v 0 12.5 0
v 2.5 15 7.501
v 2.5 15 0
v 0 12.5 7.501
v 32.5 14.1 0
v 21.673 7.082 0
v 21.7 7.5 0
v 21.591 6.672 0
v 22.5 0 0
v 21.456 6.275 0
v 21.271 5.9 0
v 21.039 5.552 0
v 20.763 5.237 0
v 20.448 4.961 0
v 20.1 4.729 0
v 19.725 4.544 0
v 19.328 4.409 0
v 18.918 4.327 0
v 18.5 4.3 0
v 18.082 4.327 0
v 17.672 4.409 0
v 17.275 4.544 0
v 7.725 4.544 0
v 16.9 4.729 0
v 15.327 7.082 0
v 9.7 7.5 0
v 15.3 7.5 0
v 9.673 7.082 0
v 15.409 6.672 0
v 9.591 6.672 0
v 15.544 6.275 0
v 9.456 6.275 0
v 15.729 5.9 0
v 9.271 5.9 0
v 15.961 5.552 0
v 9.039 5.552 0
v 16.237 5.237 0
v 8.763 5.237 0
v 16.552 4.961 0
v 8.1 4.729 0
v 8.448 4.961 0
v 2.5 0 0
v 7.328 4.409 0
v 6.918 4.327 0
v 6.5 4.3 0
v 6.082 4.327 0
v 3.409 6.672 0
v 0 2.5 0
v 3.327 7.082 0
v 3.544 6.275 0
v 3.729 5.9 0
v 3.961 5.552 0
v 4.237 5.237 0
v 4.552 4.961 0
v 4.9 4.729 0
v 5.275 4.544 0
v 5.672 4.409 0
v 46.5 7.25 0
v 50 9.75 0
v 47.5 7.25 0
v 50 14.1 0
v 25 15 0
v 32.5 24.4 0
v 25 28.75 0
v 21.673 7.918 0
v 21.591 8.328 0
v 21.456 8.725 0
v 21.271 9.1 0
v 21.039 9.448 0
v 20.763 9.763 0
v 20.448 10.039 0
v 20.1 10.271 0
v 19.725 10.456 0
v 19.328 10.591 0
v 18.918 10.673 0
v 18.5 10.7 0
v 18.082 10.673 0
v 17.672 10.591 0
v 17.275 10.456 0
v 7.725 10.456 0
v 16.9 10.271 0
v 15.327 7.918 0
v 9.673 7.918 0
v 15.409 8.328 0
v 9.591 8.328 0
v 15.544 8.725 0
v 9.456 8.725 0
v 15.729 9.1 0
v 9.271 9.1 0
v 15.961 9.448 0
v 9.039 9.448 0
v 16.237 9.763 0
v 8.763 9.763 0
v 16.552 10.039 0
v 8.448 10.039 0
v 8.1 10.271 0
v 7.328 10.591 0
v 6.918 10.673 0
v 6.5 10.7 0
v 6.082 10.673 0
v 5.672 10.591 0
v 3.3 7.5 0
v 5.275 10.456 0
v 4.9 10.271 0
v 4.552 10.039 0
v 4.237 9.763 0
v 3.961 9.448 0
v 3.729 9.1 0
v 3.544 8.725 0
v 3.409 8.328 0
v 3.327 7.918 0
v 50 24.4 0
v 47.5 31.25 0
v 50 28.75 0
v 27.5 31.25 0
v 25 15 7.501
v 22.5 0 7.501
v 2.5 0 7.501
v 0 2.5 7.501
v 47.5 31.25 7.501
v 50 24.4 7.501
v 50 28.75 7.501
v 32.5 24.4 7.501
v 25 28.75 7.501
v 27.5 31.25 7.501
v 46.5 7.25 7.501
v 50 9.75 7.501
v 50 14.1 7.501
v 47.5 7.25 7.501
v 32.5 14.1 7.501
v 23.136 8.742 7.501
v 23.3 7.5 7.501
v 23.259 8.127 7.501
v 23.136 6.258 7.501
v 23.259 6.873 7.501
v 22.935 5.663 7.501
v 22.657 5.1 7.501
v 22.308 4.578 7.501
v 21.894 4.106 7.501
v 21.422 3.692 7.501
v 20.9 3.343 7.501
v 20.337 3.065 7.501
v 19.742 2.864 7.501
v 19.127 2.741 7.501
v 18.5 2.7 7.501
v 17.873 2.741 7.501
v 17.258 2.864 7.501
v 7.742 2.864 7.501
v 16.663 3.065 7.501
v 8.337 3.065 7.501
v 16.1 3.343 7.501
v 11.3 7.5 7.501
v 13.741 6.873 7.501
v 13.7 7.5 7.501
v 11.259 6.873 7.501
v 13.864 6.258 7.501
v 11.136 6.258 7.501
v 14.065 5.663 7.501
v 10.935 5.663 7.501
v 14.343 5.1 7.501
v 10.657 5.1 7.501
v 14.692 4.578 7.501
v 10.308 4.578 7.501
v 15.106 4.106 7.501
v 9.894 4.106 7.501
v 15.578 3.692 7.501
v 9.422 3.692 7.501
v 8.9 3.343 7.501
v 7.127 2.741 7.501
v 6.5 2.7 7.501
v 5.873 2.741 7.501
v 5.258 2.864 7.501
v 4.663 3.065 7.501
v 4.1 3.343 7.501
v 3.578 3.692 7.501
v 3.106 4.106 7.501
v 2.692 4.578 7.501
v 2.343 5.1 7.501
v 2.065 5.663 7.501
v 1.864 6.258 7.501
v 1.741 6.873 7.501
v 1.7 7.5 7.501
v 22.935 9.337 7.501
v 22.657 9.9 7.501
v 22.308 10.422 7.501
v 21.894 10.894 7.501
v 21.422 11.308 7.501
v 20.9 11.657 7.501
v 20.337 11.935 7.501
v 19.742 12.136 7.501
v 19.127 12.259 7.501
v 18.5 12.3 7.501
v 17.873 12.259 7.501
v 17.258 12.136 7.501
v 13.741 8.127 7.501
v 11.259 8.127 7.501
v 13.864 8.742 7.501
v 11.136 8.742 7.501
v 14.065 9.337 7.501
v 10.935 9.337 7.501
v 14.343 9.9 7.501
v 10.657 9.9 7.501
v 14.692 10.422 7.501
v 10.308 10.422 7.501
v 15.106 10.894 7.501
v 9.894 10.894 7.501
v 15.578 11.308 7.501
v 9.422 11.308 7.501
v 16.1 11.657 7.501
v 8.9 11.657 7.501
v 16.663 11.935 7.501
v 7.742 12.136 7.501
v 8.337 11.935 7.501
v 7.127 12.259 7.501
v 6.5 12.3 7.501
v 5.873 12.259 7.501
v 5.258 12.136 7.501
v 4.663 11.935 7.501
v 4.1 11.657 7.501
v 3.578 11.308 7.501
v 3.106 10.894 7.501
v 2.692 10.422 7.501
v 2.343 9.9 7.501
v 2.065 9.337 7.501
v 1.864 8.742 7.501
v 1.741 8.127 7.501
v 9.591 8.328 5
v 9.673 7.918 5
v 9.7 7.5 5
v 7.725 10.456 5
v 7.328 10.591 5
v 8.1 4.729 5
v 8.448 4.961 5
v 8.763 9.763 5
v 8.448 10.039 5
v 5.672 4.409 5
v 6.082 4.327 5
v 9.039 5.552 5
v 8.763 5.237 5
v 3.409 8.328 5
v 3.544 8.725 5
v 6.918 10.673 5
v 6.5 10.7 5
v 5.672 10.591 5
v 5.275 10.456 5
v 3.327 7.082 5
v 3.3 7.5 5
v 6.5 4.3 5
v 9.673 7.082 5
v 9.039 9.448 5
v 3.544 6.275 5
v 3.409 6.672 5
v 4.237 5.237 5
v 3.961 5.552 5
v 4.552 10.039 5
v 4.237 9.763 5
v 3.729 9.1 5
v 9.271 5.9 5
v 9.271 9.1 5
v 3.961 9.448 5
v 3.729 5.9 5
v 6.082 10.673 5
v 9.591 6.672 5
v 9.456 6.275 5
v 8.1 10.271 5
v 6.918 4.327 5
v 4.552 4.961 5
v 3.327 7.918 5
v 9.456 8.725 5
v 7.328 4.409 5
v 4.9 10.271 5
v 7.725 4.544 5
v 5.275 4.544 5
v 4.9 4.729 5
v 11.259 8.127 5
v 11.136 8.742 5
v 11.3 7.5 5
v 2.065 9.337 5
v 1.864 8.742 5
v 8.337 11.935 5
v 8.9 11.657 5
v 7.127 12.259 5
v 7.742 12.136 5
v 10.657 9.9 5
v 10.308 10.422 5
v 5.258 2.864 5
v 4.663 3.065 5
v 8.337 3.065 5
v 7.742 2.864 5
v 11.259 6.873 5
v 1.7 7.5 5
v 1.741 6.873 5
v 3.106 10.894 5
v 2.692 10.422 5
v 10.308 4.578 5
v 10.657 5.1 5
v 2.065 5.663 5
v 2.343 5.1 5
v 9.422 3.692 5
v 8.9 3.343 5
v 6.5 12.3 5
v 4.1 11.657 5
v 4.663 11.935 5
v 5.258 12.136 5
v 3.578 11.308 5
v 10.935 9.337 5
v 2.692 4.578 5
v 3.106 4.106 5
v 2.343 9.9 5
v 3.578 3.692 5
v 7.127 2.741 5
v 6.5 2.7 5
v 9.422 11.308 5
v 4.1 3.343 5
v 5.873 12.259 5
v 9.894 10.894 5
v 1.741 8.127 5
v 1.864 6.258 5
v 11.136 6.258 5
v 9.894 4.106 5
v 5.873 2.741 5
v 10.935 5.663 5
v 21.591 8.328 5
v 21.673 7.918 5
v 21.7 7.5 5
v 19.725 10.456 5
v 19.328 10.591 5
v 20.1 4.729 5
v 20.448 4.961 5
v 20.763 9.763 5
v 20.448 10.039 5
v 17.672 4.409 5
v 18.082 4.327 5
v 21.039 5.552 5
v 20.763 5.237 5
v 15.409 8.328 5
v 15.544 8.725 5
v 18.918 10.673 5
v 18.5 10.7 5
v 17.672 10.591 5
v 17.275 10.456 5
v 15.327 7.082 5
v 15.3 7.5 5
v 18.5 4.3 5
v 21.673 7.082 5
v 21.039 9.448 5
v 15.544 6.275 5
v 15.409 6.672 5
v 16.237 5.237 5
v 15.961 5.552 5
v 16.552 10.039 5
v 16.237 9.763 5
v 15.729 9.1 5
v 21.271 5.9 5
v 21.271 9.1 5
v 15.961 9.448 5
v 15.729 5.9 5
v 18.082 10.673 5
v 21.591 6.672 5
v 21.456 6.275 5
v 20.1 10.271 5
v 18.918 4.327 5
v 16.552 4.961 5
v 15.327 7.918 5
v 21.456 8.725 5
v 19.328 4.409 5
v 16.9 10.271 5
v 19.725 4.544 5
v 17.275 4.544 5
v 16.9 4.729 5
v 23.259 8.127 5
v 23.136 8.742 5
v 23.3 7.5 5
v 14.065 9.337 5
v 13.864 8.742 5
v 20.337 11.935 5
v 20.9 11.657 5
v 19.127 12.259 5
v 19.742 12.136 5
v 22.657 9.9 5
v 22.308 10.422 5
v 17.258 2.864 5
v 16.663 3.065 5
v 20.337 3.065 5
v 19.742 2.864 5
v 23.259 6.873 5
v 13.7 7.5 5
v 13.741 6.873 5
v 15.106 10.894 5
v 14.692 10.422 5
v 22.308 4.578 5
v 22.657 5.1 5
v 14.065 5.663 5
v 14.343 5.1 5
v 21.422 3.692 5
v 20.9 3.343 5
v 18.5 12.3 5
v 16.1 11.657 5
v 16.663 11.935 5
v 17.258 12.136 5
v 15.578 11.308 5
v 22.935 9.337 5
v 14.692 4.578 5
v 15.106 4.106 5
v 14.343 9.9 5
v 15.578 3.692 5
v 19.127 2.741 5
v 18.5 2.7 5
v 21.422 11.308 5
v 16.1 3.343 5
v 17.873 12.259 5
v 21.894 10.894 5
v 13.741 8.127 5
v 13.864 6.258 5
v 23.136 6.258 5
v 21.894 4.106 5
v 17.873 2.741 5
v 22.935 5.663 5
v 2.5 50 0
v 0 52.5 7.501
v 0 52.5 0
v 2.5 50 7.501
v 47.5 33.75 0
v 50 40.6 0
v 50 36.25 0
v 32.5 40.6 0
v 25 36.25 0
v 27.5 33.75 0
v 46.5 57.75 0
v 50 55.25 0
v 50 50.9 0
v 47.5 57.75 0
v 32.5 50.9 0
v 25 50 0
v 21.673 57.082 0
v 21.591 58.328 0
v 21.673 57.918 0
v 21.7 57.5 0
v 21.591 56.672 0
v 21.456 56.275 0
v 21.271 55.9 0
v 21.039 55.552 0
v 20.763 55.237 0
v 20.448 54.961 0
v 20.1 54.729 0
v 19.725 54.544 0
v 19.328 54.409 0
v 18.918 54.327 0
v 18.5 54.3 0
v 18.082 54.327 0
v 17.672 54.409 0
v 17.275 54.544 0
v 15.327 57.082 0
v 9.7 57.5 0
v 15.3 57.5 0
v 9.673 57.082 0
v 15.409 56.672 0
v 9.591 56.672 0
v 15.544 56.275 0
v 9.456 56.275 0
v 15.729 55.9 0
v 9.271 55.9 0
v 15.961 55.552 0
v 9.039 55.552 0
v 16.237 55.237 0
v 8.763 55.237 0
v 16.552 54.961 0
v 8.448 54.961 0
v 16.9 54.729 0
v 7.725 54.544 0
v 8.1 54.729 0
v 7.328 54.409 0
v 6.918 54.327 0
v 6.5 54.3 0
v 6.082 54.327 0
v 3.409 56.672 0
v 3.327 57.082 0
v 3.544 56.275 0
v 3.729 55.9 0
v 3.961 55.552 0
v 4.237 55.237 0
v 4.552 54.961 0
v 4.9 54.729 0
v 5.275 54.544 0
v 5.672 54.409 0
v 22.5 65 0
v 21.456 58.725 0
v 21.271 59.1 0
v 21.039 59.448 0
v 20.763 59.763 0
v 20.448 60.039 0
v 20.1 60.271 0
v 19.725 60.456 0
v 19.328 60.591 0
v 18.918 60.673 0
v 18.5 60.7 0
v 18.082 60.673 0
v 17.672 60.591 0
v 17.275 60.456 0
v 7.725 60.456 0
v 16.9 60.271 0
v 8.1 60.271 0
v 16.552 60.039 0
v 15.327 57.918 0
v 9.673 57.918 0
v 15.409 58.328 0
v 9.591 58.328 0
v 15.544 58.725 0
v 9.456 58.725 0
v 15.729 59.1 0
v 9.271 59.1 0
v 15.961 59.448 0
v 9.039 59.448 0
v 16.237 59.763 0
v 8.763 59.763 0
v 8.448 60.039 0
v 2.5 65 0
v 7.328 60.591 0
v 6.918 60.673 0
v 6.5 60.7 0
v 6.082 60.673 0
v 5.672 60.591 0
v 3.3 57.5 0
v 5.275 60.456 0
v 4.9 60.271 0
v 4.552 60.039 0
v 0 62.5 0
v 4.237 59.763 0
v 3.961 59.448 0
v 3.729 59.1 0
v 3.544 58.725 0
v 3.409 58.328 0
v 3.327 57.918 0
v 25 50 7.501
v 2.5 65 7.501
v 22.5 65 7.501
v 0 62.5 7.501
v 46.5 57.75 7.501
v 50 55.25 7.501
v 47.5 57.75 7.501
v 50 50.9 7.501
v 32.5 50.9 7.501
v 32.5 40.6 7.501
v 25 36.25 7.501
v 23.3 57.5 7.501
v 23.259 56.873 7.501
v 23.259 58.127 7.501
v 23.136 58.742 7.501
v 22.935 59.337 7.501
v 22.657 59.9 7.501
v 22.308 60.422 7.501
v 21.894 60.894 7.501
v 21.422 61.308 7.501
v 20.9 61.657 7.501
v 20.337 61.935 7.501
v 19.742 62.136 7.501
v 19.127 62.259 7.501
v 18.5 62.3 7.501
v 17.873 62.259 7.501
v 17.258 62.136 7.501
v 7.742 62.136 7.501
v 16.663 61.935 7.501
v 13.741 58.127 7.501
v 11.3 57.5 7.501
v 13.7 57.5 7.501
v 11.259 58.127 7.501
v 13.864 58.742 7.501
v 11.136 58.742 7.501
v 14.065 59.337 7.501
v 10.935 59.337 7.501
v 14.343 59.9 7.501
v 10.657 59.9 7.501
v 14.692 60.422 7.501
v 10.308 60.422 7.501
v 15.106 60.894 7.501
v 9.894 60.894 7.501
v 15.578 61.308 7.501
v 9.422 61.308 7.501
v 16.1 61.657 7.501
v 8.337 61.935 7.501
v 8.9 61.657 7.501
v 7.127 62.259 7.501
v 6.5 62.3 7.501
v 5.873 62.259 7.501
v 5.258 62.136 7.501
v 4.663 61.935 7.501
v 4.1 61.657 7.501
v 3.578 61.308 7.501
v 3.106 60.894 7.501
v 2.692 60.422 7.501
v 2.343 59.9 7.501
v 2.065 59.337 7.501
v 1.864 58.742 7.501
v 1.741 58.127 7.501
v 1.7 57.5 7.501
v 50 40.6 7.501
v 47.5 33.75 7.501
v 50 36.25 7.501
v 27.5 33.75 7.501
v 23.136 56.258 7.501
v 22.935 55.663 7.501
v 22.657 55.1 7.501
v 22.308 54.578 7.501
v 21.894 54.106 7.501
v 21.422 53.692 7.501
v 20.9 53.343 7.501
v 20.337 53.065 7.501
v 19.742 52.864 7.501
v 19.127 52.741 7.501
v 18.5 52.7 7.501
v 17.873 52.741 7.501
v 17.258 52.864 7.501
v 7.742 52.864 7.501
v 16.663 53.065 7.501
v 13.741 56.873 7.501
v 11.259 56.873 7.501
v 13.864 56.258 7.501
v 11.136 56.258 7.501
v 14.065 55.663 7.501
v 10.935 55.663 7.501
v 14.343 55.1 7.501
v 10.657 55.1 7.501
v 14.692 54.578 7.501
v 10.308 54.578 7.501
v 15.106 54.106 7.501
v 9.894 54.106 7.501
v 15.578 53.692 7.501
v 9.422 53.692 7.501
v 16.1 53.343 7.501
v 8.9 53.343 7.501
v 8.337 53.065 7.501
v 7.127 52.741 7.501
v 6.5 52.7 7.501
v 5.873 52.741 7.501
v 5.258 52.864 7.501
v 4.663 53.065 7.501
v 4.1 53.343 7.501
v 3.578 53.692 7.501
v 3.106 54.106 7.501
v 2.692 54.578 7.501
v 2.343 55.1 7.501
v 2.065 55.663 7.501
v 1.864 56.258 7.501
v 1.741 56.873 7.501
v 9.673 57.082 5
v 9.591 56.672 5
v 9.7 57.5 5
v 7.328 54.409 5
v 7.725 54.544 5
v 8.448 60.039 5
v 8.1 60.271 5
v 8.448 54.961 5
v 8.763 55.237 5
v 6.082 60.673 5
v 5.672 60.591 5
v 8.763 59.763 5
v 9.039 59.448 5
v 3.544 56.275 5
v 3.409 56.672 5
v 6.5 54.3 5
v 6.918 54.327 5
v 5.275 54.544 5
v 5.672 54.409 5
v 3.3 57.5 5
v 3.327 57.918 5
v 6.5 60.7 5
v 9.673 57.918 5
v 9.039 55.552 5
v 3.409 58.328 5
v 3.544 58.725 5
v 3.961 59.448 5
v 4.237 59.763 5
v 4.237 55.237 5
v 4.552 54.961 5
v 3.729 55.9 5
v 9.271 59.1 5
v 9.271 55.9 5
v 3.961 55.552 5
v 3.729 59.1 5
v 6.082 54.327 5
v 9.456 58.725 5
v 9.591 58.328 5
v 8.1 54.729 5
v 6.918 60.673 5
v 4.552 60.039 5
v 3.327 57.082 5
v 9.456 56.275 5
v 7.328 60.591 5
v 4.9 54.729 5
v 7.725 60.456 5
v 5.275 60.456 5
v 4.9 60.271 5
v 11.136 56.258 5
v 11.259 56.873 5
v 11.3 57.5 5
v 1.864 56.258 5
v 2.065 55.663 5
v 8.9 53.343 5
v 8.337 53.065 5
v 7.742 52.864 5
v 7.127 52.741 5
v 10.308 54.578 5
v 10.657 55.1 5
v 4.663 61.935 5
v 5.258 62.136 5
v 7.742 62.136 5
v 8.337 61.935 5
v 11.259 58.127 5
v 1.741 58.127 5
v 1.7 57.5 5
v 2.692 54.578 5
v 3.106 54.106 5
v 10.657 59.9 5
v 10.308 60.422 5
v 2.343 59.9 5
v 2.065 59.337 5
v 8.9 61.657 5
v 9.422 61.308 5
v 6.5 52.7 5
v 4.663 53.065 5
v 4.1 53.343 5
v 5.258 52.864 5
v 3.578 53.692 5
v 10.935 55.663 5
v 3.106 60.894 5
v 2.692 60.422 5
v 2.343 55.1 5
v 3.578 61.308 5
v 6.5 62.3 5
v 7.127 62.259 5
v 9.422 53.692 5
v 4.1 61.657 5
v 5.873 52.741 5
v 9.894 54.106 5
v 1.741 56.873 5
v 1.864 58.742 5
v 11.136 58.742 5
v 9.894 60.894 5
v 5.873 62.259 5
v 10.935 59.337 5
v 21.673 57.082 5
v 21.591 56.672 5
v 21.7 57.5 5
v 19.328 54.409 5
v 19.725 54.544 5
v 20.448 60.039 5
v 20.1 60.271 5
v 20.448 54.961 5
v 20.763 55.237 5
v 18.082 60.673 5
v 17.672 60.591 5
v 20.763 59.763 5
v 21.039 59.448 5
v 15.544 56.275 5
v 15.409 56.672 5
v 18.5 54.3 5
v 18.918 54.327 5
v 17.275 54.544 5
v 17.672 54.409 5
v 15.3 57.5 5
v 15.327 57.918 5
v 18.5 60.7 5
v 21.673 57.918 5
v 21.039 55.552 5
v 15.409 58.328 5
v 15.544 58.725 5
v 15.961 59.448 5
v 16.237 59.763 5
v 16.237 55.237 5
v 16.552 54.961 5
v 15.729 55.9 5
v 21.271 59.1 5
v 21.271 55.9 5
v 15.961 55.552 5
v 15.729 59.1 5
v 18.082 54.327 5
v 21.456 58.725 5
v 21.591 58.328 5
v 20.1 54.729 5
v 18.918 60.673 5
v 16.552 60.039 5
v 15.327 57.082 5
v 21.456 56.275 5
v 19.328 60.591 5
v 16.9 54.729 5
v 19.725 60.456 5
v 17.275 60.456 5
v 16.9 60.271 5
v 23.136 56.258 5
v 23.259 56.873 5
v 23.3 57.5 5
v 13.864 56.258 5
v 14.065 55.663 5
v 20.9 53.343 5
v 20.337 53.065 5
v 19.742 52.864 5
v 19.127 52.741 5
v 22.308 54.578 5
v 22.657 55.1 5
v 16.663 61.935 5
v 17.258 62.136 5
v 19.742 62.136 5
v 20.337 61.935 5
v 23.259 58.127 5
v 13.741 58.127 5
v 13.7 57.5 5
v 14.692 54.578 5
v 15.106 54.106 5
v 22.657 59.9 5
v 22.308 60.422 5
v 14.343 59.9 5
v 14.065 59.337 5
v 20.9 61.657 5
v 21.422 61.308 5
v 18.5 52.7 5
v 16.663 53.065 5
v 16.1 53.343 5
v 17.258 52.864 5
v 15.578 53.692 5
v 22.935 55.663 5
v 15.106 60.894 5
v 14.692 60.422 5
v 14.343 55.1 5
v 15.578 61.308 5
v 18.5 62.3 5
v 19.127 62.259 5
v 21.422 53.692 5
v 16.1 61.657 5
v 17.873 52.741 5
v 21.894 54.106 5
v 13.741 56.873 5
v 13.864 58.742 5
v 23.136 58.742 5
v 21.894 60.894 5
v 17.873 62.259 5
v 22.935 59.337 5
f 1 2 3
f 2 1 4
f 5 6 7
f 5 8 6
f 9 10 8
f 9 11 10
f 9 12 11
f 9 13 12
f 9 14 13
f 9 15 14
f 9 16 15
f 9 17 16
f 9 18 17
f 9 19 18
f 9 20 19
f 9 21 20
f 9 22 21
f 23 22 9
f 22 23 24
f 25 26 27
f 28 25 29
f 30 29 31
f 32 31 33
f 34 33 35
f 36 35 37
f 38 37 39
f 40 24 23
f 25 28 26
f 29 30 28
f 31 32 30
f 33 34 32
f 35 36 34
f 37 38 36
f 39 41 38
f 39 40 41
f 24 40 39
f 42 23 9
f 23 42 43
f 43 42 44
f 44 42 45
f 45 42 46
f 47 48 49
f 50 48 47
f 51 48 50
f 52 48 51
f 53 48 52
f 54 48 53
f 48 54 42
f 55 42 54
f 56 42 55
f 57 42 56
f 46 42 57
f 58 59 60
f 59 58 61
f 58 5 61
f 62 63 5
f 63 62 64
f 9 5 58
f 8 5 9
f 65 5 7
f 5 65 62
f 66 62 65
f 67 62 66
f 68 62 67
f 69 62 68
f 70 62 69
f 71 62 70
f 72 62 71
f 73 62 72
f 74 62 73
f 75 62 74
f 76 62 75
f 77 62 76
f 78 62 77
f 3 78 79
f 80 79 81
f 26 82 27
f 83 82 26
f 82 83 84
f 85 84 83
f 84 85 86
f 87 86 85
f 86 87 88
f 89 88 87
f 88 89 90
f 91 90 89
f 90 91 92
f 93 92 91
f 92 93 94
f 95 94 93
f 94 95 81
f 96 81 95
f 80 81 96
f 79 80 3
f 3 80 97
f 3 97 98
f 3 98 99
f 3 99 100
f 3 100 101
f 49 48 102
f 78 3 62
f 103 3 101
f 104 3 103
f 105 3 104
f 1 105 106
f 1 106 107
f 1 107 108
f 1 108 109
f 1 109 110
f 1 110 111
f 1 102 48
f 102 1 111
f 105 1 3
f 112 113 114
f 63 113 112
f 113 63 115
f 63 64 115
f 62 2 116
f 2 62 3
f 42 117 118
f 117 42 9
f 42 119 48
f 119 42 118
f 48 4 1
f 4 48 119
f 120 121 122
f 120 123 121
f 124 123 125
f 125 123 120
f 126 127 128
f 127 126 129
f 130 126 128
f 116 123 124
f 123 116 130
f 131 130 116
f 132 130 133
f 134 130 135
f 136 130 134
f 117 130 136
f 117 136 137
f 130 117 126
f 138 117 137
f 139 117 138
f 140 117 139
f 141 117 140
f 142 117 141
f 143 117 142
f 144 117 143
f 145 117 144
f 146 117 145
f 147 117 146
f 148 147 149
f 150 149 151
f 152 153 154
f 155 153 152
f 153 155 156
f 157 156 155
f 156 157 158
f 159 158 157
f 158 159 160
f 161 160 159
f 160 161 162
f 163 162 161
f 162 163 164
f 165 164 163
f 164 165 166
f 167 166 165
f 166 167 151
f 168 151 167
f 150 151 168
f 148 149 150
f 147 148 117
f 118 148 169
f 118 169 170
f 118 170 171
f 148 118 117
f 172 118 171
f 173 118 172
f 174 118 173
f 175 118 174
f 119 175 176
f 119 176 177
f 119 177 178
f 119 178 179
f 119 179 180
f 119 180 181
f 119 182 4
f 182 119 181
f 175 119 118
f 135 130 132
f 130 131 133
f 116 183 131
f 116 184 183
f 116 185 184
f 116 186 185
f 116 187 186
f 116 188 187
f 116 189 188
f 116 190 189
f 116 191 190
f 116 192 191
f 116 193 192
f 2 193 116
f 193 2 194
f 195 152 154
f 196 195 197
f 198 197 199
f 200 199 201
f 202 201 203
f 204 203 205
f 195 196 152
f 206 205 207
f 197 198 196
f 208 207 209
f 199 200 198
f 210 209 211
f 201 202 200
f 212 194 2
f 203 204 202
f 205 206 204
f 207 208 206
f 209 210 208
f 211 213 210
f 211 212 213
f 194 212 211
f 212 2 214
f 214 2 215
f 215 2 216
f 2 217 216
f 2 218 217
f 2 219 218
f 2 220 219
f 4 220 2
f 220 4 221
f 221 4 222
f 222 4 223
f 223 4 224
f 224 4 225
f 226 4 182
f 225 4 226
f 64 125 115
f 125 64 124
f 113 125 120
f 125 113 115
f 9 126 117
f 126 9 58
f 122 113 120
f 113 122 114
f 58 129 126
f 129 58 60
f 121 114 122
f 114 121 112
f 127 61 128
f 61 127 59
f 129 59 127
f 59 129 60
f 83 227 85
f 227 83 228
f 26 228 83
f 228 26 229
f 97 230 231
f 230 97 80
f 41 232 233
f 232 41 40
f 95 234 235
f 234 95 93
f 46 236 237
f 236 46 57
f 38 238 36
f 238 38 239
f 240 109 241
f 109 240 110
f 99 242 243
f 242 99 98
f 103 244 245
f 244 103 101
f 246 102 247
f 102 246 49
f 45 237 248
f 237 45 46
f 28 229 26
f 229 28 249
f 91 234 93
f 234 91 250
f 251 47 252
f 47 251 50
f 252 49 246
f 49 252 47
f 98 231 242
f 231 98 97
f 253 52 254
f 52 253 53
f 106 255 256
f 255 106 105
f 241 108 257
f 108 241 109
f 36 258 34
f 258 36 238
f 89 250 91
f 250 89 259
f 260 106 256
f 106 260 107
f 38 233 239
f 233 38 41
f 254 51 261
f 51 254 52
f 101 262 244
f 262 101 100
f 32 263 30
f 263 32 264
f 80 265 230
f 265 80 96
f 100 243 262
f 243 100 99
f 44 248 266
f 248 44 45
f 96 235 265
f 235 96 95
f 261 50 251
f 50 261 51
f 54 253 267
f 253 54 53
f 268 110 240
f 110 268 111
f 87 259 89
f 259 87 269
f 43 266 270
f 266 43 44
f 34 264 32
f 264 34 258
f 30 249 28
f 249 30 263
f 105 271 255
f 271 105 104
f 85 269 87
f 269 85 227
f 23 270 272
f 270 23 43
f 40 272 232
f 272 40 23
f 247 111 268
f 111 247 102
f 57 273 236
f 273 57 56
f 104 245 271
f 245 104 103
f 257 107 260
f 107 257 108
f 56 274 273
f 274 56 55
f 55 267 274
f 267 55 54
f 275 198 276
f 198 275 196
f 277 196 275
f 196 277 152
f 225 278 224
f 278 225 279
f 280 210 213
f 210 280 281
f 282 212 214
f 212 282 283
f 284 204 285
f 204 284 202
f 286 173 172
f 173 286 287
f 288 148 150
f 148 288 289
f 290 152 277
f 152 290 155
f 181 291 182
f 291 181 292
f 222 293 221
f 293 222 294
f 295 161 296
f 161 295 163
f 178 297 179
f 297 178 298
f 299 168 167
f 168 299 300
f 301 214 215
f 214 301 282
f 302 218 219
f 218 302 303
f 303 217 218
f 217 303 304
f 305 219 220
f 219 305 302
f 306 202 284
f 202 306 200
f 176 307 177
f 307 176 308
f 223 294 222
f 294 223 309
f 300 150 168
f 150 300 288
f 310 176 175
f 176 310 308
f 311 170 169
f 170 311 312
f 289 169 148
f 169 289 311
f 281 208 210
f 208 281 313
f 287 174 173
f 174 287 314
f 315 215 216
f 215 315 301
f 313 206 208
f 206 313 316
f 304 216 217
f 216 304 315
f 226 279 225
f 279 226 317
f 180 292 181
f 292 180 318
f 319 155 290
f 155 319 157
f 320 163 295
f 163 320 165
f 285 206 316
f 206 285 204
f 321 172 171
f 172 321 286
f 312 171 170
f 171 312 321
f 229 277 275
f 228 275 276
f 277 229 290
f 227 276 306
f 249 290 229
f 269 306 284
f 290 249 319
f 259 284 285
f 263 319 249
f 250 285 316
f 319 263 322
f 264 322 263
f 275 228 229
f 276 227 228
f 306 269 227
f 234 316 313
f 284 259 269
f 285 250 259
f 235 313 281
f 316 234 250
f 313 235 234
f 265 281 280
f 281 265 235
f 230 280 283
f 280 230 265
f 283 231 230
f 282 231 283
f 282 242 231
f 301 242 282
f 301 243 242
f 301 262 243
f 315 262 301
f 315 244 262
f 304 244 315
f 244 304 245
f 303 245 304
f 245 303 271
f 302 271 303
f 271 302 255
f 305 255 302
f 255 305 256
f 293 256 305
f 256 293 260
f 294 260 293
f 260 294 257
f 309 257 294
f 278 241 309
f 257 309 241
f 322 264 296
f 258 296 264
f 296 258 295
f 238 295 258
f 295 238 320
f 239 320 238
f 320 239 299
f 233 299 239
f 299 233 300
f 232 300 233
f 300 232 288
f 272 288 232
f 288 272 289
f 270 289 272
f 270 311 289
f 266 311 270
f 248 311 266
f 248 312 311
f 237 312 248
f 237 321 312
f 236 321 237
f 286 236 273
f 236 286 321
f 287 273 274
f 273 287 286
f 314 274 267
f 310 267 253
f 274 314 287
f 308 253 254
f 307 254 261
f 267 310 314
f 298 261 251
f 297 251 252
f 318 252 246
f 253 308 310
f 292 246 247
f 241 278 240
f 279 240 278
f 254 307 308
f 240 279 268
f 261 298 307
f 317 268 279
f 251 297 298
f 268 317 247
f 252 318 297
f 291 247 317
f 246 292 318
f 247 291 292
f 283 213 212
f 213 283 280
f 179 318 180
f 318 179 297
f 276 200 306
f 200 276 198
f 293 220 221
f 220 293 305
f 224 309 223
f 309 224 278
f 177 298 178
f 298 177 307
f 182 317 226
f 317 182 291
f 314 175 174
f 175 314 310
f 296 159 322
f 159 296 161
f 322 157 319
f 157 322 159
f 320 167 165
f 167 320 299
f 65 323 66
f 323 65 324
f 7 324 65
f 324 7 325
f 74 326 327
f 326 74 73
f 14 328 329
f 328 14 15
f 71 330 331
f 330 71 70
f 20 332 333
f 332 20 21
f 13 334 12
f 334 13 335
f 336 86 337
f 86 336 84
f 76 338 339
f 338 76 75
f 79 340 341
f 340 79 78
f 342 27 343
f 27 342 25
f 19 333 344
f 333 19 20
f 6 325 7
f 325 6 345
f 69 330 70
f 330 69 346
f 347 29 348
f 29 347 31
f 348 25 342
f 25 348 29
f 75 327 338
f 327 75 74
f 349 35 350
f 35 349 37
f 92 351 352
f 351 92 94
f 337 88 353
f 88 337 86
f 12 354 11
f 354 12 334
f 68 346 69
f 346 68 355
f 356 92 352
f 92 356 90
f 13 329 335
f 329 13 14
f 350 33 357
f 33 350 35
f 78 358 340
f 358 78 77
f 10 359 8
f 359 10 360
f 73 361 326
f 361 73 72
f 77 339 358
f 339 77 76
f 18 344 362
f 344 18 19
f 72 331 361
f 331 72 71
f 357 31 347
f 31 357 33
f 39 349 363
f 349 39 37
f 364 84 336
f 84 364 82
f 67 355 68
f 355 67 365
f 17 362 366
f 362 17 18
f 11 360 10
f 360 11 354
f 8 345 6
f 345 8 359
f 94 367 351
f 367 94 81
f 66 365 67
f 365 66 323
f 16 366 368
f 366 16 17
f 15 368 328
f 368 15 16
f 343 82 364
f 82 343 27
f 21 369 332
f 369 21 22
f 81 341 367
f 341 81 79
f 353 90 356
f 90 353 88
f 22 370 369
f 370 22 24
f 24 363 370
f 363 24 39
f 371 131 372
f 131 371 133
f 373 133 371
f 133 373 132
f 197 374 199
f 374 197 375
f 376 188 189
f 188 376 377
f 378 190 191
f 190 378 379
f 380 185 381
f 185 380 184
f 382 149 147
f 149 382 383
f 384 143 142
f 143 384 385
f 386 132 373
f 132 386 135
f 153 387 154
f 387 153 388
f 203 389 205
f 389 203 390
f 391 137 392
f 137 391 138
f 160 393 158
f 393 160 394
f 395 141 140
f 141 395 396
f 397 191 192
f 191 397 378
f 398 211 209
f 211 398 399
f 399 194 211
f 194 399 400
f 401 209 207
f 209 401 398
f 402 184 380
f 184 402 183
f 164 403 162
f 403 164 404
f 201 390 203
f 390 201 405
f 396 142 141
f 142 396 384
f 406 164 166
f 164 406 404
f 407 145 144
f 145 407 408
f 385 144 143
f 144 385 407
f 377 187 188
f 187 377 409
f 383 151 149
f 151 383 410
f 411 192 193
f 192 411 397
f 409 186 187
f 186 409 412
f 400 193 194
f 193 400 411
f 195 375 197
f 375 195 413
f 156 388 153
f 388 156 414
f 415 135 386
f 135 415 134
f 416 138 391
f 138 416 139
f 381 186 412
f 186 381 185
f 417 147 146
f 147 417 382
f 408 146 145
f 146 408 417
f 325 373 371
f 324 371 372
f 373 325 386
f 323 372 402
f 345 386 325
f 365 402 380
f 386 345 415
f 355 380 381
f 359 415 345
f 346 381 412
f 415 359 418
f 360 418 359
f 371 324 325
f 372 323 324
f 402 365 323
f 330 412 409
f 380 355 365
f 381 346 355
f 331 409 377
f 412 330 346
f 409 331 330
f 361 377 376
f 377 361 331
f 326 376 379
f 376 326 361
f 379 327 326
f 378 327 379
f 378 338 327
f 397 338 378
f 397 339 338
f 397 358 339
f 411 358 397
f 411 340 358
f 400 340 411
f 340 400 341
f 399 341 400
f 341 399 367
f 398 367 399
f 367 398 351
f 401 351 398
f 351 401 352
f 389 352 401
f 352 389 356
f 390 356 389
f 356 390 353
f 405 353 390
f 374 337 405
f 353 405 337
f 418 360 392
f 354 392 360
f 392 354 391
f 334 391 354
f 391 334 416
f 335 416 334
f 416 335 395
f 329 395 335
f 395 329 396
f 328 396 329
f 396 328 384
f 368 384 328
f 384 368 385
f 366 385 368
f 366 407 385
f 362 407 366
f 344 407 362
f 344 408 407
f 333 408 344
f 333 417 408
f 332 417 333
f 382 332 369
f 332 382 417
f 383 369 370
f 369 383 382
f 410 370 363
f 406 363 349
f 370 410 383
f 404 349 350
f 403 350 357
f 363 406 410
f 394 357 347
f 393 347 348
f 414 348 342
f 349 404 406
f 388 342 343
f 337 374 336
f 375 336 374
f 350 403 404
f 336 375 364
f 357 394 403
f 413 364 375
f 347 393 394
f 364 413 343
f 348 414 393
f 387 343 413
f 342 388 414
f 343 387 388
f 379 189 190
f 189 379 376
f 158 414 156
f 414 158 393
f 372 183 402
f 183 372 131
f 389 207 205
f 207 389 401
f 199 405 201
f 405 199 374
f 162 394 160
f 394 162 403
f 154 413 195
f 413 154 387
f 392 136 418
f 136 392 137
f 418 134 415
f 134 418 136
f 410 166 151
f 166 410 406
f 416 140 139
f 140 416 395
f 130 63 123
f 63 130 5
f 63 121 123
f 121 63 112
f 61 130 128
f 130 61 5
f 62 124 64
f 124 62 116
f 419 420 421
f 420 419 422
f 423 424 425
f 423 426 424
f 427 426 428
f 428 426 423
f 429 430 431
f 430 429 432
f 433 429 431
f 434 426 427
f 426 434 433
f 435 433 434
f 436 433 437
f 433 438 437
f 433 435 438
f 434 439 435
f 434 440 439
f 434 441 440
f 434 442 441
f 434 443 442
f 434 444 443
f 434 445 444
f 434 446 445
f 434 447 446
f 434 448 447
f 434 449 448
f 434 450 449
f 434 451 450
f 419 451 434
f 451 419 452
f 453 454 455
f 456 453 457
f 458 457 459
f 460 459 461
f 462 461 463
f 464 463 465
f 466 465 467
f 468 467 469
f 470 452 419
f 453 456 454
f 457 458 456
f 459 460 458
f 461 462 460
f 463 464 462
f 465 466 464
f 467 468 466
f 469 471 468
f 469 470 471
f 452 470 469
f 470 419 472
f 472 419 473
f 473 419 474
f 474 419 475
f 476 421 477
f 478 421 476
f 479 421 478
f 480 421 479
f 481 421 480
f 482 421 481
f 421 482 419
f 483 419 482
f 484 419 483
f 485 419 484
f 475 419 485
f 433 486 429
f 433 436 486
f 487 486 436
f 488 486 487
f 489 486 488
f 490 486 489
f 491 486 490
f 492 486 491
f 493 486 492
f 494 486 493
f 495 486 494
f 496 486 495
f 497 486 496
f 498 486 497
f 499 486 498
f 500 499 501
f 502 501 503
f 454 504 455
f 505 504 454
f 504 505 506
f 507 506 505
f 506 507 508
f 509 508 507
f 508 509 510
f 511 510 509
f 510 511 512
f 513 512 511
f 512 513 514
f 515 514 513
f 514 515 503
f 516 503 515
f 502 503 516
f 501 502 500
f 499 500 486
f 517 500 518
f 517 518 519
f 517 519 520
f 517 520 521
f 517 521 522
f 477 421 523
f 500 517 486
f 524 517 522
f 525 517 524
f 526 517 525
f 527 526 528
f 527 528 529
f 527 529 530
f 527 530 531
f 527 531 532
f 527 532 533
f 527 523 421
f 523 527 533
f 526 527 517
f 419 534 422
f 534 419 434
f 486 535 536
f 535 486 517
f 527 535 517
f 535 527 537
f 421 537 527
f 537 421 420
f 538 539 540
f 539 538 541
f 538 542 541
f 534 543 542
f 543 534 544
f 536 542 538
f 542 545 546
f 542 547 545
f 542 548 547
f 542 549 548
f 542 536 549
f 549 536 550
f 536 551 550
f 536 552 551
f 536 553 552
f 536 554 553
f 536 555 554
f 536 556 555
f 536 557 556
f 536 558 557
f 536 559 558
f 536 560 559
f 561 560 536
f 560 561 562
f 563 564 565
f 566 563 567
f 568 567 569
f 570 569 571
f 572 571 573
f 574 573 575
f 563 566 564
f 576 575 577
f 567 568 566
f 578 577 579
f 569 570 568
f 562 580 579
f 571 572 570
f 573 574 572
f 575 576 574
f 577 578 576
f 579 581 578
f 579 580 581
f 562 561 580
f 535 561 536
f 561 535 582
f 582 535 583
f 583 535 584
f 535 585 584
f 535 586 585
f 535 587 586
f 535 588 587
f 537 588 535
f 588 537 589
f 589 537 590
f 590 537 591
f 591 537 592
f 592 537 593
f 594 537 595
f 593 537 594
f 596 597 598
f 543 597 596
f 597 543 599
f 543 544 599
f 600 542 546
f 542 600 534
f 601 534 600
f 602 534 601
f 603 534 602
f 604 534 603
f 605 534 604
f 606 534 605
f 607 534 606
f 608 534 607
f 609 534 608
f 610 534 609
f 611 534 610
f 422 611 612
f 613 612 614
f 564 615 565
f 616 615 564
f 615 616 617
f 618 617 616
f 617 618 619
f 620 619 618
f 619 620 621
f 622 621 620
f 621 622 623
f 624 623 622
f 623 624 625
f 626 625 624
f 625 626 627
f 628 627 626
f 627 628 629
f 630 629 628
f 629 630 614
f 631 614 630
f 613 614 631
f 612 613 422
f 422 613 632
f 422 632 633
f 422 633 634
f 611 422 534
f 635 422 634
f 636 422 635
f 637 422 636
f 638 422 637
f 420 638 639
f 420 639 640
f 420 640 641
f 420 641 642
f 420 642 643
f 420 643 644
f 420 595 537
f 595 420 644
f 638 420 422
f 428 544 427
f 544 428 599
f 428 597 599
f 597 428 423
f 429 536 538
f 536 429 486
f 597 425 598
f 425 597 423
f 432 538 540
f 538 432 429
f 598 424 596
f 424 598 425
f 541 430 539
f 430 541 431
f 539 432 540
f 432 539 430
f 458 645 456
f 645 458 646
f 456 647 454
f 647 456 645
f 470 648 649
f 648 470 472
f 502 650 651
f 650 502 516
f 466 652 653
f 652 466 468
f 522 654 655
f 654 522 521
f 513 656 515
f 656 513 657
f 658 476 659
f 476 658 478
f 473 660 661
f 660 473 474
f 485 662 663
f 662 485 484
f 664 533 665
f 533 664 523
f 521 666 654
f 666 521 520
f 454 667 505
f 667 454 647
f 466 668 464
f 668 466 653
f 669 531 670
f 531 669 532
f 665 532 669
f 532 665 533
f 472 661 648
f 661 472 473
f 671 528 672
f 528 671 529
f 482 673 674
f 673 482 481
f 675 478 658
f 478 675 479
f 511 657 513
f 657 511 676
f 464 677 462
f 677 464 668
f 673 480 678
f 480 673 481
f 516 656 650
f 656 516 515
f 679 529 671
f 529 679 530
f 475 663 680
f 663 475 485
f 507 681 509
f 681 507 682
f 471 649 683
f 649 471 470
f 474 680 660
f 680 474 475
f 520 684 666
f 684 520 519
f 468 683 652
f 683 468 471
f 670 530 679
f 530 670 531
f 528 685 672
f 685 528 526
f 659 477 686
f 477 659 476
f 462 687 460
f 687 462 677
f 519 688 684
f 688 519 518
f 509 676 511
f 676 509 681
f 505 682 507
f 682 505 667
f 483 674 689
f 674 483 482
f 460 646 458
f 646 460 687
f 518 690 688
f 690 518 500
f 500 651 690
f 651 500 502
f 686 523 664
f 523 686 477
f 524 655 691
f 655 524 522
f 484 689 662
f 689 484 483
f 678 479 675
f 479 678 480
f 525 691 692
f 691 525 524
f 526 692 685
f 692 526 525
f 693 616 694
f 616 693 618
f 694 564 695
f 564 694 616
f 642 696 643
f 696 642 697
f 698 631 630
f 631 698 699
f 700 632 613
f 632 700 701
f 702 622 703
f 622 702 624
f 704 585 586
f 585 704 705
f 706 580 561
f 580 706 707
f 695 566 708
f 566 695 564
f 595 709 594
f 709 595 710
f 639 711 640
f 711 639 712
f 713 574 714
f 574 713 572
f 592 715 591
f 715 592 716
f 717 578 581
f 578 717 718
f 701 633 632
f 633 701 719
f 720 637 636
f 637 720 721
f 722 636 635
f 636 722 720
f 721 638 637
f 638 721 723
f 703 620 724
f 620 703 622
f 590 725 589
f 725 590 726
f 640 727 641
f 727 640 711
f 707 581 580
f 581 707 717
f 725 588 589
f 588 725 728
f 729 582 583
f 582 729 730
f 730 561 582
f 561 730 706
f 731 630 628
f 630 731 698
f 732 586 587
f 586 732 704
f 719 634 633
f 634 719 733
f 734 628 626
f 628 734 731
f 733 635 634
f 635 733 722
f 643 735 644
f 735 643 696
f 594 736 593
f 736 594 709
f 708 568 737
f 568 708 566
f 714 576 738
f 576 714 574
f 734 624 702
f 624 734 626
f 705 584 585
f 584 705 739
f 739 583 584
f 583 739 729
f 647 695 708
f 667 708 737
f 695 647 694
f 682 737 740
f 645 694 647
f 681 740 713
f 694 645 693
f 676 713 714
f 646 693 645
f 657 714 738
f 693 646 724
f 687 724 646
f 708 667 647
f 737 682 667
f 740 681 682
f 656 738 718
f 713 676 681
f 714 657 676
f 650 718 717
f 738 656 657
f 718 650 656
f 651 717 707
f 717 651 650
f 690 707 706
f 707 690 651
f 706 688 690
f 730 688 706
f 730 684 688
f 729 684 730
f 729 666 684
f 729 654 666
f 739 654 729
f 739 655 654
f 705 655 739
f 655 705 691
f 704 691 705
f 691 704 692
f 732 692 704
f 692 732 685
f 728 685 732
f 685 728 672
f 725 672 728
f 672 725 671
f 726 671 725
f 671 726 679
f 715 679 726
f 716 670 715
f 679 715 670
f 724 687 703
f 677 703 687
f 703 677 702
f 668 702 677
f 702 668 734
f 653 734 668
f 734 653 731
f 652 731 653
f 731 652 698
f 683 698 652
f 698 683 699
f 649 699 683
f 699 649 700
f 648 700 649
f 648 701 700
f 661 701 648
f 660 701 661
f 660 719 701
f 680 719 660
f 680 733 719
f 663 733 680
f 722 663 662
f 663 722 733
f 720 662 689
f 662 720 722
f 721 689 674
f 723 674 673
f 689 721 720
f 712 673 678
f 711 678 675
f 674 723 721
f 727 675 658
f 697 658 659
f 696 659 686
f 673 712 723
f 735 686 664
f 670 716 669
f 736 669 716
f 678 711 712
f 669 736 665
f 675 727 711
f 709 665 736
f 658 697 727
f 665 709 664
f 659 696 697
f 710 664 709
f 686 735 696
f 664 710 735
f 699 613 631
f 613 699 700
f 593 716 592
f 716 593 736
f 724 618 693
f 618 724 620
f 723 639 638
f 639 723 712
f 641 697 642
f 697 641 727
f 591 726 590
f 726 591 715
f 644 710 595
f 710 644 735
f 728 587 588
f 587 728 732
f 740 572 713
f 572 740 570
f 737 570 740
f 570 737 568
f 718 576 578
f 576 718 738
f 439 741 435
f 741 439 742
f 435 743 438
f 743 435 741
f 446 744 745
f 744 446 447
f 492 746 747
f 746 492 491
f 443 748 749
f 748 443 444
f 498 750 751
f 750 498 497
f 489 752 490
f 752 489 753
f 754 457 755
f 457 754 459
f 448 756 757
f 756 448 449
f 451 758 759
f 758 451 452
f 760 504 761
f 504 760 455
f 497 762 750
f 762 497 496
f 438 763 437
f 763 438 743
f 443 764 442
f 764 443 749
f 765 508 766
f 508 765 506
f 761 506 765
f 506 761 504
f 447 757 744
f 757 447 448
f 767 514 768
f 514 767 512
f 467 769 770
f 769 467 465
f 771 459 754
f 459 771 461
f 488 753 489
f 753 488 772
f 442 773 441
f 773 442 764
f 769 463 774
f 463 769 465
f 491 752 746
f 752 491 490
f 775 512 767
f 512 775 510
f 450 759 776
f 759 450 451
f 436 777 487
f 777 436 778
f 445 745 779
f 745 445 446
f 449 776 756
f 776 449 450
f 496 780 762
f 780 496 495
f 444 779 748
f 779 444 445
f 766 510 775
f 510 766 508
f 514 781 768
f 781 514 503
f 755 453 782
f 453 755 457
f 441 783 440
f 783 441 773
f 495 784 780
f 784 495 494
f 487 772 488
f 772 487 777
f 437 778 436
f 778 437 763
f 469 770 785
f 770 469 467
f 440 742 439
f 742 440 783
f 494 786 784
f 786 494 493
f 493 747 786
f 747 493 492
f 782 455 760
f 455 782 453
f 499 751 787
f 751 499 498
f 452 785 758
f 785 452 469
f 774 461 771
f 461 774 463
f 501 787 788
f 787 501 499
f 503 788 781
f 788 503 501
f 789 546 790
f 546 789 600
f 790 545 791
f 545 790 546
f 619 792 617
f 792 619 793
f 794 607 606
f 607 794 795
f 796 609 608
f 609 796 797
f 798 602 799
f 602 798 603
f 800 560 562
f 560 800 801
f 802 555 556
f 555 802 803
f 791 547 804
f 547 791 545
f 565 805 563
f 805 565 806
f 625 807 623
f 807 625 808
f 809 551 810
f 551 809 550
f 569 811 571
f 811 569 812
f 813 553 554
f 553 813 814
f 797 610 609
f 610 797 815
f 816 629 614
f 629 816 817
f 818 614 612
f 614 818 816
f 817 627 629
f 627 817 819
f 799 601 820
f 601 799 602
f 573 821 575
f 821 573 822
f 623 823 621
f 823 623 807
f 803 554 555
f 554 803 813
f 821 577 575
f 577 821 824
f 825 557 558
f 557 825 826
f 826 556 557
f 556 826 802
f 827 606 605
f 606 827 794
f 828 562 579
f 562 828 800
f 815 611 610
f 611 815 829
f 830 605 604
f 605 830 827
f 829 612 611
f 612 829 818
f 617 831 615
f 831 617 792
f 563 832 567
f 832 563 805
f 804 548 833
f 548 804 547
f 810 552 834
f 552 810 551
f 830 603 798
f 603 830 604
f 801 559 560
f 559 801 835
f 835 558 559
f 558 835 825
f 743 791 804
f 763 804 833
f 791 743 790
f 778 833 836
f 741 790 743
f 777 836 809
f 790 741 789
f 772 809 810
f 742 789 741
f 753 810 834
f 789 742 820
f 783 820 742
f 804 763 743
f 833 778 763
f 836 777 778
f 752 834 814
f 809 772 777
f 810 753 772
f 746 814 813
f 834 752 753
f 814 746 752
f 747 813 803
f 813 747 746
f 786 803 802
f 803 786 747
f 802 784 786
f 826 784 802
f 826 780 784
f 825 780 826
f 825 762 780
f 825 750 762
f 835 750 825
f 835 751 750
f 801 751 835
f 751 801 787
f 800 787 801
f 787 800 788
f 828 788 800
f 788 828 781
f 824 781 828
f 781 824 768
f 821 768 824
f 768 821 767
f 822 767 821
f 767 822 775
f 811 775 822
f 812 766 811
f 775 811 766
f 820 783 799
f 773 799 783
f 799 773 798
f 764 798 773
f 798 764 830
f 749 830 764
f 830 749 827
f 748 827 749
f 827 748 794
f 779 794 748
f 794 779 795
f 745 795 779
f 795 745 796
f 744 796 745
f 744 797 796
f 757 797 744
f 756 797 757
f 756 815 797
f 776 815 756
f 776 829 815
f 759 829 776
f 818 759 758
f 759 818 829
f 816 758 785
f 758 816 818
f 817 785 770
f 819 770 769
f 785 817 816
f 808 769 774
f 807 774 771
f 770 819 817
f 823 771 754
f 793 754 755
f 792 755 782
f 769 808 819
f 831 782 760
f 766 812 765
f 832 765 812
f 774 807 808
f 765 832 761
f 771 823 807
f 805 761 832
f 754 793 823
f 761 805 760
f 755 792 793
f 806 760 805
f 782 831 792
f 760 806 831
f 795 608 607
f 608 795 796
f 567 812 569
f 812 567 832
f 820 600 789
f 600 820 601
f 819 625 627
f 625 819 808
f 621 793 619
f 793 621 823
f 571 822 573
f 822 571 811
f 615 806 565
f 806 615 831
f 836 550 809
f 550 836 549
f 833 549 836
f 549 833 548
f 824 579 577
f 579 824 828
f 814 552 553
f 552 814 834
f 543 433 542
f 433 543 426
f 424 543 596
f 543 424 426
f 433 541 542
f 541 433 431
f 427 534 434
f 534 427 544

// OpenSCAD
// file: scad/tapercube.scad
module tapercube(width=10, height=10, depth=10, taper=3.0) {
  plane = 0.001;
  hull() {
    translate([taper/2,taper/2,0])
      cube([width-taper, height-taper, plane]);
    translate([0,0,taper/2]) {
      translate([0,taper/2])
        cube([width, height-taper, plane]);
      translate([taper/2,0])
        cube([width-taper, height, plane]);
    }

    translate([taper/2,taper/2,depth-plane])
      cube([width-taper, height-taper, plane]);
    translate([0,0,depth-taper/2]) {
      translate([0,taper/2])
        cube([width, height-taper, plane]);
      translate([taper/2,0])
        cube([width-taper, height, plane]);
    }
  }
}

module cornerless_cube(width=10, height=10, depth=10, taper=3.0) {
  plane = 0.001;
  hull() {
    translate([0,taper/2])
      cube([width, height-taper, plane]);
    translate([taper/2,0])
      cube([width-taper, height, plane]);

    translate([0,0,depth]) {
      translate([0,taper/2])
        cube([width, height-taper, plane]);
      translate([taper/2,0])
        cube([width-taper, height, plane]);
    }
  }
}
// main file
include <scad/tapercube.scad>;

long=100;
shim=0.1;
fudge = 0.3;

tensioner_bolt_r = 1.75 + fudge;
tensioner_nut_r = 3.15 + fudge;
tensioner_nut_th = 2.4;

bolt_r = 2.9+fudge;
bolt_head_r = 4.5+fudge;
bolt_head_seat = 2.5;

bearing_r = 12.0+fudge;
bearing_th = 6.0+fudge;
bearing_u_th = 10+fudge;
bearing_arm_th = 7.0;
bearing_nut_r = 4.5+fudge;
bearing_nut_th = 3.0;
washer_th = 0.5;

makerslide_w = 40.0;
makerslide_deck = 7.25;

ms_arm_th = 7.5;
ms_arm_w = 15.0;
ms_upper_arm_w = 24.0;
ms_arm_l = 25.0;
ms_arm_between = 12.0;
slot_depth = 15.0;
slot_w = bearing_u_th;

taper = 5.0;

module bearing_bracket() {
  ms_arm_extra = 5.0;
  bar_th = 6.0;
  bar_w = makerslide_w+ms_arm_th*2 + ms_arm_extra;
  block_w = bearing_th*2+washer_th*3 + bearing_arm_th*2;
  block_h = bearing_r*2+bearing_arm_th;

  difference() {
    union() {
      cube([bar_w, bar_th, slot_w-fudge]);
      translate([bar_w/2-block_w/2, 0])
        cornerless_cube(block_w, block_h, bearing_u_th, 3.0);
    }
    translate([bar_w/2-(block_w-bearing_arm_th*2)/2, -shim, -shim])
      cube([(block_w-bearing_arm_th*2), bearing_r*2, bearing_u_th+shim*2]);

    // 5mm bolt hole for bearings
    translate([0, bearing_r, bearing_u_th/2]) {
      rotate([0, 90, 0]) {
        cylinder(r=bolt_r, h=long, $fn=48);
        translate([0, 0, bar_w/2+block_w/2-bearing_nut_th+shim])
          rotate([0, 0, 30])
            cylinder(r=bearing_nut_r, h=bearing_nut_th, $fn=6);
      }
    }

    // 3mm bolt holes for belt tensioners
    // LEFT
    translate([ms_arm_extra/2+ms_arm_th/2, long/2, slot_w/2])
      rotate([90, 0, 0]) {
        cylinder(r=tensioner_bolt_r, long, $fn=48);
        translate([0, 0, long/2-tensioner_nut_th+shim])
          rotate([0, 0, 0])
            cylinder(r=tensioner_nut_r, h=tensioner_nut_th, $fn=6);
      }
    // RIGHT
    translate([bar_w-ms_arm_th/2-ms_arm_extra/2, long/2, slot_w/2])
      rotate([90, 0, 0]) {
        cylinder(r=tensioner_bolt_r, long, $fn=48);
        translate([0, 0, long/2-tensioner_nut_th+shim])
          rotate([0, 0, 0])
            cylinder(r=tensioner_nut_r, h=tensioner_nut_th, $fn=6);
      }
  }
}

module makerslide_bracket() {
  difference() {
    union() {
      // lower arm connected to makerslide
      cornerless_cube(ms_arm_l, ms_arm_w, ms_arm_th, taper);
      
      // connect the lower arm to upper arm
      hull() {
        translate([ms_arm_l - ms_arm_w, 0])
          cornerless_cube(ms_arm_w, ms_arm_w, ms_arm_th, taper);

        translate([ms_arm_l, makerslide_deck])
          cornerless_cube(ms_upper_arm_w, ms_upper_arm_w, ms_arm_th, taper);
      }

      // upper arm ready to receive bearing_bracket
      translate([ms_arm_l, makerslide_deck])
          cornerless_cube(ms_arm_l, ms_upper_arm_w, ms_arm_th, taper);
    }

    translate([ms_arm_l, makerslide_deck])
      translate([taper*1.5, ms_upper_arm_w/2-slot_w/2, -shim])
        cube([ms_arm_l, slot_w, ms_arm_th+shim*2]);

    // Make room for makerslide v rail
    translate([0, ms_arm_w, -shim])
      cube(ms_arm_l, ms_arm_w, ms_arm_th+shim*2);

    // Bolt holes
    translate([0, ms_arm_w/2, -long/2]) {
      translate([ms_arm_l/2 - ms_arm_between/2, 0]) {
        cylinder(r=bolt_r, h=long, $fn=48);
        translate([0, 0, long/2 + ms_arm_th - bolt_head_seat])
          cylinder(r=bolt_head_r, h=5, $fn=48);
      }
      translate([ms_arm_l/2 + ms_arm_between/2, 0]) {
        cylinder(r=bolt_r, h=long, $fn=48);
        translate([0, 0, long/2 + ms_arm_th - bolt_head_seat])
          cylinder(r=bolt_head_r, h=5, $fn=48);
      }
    }

  }
}

// bearing_bracket();

makerslide_bracket();
translate([0, 65, 0])
  scale([1, -1, 1])
    makerslide_bracket();
